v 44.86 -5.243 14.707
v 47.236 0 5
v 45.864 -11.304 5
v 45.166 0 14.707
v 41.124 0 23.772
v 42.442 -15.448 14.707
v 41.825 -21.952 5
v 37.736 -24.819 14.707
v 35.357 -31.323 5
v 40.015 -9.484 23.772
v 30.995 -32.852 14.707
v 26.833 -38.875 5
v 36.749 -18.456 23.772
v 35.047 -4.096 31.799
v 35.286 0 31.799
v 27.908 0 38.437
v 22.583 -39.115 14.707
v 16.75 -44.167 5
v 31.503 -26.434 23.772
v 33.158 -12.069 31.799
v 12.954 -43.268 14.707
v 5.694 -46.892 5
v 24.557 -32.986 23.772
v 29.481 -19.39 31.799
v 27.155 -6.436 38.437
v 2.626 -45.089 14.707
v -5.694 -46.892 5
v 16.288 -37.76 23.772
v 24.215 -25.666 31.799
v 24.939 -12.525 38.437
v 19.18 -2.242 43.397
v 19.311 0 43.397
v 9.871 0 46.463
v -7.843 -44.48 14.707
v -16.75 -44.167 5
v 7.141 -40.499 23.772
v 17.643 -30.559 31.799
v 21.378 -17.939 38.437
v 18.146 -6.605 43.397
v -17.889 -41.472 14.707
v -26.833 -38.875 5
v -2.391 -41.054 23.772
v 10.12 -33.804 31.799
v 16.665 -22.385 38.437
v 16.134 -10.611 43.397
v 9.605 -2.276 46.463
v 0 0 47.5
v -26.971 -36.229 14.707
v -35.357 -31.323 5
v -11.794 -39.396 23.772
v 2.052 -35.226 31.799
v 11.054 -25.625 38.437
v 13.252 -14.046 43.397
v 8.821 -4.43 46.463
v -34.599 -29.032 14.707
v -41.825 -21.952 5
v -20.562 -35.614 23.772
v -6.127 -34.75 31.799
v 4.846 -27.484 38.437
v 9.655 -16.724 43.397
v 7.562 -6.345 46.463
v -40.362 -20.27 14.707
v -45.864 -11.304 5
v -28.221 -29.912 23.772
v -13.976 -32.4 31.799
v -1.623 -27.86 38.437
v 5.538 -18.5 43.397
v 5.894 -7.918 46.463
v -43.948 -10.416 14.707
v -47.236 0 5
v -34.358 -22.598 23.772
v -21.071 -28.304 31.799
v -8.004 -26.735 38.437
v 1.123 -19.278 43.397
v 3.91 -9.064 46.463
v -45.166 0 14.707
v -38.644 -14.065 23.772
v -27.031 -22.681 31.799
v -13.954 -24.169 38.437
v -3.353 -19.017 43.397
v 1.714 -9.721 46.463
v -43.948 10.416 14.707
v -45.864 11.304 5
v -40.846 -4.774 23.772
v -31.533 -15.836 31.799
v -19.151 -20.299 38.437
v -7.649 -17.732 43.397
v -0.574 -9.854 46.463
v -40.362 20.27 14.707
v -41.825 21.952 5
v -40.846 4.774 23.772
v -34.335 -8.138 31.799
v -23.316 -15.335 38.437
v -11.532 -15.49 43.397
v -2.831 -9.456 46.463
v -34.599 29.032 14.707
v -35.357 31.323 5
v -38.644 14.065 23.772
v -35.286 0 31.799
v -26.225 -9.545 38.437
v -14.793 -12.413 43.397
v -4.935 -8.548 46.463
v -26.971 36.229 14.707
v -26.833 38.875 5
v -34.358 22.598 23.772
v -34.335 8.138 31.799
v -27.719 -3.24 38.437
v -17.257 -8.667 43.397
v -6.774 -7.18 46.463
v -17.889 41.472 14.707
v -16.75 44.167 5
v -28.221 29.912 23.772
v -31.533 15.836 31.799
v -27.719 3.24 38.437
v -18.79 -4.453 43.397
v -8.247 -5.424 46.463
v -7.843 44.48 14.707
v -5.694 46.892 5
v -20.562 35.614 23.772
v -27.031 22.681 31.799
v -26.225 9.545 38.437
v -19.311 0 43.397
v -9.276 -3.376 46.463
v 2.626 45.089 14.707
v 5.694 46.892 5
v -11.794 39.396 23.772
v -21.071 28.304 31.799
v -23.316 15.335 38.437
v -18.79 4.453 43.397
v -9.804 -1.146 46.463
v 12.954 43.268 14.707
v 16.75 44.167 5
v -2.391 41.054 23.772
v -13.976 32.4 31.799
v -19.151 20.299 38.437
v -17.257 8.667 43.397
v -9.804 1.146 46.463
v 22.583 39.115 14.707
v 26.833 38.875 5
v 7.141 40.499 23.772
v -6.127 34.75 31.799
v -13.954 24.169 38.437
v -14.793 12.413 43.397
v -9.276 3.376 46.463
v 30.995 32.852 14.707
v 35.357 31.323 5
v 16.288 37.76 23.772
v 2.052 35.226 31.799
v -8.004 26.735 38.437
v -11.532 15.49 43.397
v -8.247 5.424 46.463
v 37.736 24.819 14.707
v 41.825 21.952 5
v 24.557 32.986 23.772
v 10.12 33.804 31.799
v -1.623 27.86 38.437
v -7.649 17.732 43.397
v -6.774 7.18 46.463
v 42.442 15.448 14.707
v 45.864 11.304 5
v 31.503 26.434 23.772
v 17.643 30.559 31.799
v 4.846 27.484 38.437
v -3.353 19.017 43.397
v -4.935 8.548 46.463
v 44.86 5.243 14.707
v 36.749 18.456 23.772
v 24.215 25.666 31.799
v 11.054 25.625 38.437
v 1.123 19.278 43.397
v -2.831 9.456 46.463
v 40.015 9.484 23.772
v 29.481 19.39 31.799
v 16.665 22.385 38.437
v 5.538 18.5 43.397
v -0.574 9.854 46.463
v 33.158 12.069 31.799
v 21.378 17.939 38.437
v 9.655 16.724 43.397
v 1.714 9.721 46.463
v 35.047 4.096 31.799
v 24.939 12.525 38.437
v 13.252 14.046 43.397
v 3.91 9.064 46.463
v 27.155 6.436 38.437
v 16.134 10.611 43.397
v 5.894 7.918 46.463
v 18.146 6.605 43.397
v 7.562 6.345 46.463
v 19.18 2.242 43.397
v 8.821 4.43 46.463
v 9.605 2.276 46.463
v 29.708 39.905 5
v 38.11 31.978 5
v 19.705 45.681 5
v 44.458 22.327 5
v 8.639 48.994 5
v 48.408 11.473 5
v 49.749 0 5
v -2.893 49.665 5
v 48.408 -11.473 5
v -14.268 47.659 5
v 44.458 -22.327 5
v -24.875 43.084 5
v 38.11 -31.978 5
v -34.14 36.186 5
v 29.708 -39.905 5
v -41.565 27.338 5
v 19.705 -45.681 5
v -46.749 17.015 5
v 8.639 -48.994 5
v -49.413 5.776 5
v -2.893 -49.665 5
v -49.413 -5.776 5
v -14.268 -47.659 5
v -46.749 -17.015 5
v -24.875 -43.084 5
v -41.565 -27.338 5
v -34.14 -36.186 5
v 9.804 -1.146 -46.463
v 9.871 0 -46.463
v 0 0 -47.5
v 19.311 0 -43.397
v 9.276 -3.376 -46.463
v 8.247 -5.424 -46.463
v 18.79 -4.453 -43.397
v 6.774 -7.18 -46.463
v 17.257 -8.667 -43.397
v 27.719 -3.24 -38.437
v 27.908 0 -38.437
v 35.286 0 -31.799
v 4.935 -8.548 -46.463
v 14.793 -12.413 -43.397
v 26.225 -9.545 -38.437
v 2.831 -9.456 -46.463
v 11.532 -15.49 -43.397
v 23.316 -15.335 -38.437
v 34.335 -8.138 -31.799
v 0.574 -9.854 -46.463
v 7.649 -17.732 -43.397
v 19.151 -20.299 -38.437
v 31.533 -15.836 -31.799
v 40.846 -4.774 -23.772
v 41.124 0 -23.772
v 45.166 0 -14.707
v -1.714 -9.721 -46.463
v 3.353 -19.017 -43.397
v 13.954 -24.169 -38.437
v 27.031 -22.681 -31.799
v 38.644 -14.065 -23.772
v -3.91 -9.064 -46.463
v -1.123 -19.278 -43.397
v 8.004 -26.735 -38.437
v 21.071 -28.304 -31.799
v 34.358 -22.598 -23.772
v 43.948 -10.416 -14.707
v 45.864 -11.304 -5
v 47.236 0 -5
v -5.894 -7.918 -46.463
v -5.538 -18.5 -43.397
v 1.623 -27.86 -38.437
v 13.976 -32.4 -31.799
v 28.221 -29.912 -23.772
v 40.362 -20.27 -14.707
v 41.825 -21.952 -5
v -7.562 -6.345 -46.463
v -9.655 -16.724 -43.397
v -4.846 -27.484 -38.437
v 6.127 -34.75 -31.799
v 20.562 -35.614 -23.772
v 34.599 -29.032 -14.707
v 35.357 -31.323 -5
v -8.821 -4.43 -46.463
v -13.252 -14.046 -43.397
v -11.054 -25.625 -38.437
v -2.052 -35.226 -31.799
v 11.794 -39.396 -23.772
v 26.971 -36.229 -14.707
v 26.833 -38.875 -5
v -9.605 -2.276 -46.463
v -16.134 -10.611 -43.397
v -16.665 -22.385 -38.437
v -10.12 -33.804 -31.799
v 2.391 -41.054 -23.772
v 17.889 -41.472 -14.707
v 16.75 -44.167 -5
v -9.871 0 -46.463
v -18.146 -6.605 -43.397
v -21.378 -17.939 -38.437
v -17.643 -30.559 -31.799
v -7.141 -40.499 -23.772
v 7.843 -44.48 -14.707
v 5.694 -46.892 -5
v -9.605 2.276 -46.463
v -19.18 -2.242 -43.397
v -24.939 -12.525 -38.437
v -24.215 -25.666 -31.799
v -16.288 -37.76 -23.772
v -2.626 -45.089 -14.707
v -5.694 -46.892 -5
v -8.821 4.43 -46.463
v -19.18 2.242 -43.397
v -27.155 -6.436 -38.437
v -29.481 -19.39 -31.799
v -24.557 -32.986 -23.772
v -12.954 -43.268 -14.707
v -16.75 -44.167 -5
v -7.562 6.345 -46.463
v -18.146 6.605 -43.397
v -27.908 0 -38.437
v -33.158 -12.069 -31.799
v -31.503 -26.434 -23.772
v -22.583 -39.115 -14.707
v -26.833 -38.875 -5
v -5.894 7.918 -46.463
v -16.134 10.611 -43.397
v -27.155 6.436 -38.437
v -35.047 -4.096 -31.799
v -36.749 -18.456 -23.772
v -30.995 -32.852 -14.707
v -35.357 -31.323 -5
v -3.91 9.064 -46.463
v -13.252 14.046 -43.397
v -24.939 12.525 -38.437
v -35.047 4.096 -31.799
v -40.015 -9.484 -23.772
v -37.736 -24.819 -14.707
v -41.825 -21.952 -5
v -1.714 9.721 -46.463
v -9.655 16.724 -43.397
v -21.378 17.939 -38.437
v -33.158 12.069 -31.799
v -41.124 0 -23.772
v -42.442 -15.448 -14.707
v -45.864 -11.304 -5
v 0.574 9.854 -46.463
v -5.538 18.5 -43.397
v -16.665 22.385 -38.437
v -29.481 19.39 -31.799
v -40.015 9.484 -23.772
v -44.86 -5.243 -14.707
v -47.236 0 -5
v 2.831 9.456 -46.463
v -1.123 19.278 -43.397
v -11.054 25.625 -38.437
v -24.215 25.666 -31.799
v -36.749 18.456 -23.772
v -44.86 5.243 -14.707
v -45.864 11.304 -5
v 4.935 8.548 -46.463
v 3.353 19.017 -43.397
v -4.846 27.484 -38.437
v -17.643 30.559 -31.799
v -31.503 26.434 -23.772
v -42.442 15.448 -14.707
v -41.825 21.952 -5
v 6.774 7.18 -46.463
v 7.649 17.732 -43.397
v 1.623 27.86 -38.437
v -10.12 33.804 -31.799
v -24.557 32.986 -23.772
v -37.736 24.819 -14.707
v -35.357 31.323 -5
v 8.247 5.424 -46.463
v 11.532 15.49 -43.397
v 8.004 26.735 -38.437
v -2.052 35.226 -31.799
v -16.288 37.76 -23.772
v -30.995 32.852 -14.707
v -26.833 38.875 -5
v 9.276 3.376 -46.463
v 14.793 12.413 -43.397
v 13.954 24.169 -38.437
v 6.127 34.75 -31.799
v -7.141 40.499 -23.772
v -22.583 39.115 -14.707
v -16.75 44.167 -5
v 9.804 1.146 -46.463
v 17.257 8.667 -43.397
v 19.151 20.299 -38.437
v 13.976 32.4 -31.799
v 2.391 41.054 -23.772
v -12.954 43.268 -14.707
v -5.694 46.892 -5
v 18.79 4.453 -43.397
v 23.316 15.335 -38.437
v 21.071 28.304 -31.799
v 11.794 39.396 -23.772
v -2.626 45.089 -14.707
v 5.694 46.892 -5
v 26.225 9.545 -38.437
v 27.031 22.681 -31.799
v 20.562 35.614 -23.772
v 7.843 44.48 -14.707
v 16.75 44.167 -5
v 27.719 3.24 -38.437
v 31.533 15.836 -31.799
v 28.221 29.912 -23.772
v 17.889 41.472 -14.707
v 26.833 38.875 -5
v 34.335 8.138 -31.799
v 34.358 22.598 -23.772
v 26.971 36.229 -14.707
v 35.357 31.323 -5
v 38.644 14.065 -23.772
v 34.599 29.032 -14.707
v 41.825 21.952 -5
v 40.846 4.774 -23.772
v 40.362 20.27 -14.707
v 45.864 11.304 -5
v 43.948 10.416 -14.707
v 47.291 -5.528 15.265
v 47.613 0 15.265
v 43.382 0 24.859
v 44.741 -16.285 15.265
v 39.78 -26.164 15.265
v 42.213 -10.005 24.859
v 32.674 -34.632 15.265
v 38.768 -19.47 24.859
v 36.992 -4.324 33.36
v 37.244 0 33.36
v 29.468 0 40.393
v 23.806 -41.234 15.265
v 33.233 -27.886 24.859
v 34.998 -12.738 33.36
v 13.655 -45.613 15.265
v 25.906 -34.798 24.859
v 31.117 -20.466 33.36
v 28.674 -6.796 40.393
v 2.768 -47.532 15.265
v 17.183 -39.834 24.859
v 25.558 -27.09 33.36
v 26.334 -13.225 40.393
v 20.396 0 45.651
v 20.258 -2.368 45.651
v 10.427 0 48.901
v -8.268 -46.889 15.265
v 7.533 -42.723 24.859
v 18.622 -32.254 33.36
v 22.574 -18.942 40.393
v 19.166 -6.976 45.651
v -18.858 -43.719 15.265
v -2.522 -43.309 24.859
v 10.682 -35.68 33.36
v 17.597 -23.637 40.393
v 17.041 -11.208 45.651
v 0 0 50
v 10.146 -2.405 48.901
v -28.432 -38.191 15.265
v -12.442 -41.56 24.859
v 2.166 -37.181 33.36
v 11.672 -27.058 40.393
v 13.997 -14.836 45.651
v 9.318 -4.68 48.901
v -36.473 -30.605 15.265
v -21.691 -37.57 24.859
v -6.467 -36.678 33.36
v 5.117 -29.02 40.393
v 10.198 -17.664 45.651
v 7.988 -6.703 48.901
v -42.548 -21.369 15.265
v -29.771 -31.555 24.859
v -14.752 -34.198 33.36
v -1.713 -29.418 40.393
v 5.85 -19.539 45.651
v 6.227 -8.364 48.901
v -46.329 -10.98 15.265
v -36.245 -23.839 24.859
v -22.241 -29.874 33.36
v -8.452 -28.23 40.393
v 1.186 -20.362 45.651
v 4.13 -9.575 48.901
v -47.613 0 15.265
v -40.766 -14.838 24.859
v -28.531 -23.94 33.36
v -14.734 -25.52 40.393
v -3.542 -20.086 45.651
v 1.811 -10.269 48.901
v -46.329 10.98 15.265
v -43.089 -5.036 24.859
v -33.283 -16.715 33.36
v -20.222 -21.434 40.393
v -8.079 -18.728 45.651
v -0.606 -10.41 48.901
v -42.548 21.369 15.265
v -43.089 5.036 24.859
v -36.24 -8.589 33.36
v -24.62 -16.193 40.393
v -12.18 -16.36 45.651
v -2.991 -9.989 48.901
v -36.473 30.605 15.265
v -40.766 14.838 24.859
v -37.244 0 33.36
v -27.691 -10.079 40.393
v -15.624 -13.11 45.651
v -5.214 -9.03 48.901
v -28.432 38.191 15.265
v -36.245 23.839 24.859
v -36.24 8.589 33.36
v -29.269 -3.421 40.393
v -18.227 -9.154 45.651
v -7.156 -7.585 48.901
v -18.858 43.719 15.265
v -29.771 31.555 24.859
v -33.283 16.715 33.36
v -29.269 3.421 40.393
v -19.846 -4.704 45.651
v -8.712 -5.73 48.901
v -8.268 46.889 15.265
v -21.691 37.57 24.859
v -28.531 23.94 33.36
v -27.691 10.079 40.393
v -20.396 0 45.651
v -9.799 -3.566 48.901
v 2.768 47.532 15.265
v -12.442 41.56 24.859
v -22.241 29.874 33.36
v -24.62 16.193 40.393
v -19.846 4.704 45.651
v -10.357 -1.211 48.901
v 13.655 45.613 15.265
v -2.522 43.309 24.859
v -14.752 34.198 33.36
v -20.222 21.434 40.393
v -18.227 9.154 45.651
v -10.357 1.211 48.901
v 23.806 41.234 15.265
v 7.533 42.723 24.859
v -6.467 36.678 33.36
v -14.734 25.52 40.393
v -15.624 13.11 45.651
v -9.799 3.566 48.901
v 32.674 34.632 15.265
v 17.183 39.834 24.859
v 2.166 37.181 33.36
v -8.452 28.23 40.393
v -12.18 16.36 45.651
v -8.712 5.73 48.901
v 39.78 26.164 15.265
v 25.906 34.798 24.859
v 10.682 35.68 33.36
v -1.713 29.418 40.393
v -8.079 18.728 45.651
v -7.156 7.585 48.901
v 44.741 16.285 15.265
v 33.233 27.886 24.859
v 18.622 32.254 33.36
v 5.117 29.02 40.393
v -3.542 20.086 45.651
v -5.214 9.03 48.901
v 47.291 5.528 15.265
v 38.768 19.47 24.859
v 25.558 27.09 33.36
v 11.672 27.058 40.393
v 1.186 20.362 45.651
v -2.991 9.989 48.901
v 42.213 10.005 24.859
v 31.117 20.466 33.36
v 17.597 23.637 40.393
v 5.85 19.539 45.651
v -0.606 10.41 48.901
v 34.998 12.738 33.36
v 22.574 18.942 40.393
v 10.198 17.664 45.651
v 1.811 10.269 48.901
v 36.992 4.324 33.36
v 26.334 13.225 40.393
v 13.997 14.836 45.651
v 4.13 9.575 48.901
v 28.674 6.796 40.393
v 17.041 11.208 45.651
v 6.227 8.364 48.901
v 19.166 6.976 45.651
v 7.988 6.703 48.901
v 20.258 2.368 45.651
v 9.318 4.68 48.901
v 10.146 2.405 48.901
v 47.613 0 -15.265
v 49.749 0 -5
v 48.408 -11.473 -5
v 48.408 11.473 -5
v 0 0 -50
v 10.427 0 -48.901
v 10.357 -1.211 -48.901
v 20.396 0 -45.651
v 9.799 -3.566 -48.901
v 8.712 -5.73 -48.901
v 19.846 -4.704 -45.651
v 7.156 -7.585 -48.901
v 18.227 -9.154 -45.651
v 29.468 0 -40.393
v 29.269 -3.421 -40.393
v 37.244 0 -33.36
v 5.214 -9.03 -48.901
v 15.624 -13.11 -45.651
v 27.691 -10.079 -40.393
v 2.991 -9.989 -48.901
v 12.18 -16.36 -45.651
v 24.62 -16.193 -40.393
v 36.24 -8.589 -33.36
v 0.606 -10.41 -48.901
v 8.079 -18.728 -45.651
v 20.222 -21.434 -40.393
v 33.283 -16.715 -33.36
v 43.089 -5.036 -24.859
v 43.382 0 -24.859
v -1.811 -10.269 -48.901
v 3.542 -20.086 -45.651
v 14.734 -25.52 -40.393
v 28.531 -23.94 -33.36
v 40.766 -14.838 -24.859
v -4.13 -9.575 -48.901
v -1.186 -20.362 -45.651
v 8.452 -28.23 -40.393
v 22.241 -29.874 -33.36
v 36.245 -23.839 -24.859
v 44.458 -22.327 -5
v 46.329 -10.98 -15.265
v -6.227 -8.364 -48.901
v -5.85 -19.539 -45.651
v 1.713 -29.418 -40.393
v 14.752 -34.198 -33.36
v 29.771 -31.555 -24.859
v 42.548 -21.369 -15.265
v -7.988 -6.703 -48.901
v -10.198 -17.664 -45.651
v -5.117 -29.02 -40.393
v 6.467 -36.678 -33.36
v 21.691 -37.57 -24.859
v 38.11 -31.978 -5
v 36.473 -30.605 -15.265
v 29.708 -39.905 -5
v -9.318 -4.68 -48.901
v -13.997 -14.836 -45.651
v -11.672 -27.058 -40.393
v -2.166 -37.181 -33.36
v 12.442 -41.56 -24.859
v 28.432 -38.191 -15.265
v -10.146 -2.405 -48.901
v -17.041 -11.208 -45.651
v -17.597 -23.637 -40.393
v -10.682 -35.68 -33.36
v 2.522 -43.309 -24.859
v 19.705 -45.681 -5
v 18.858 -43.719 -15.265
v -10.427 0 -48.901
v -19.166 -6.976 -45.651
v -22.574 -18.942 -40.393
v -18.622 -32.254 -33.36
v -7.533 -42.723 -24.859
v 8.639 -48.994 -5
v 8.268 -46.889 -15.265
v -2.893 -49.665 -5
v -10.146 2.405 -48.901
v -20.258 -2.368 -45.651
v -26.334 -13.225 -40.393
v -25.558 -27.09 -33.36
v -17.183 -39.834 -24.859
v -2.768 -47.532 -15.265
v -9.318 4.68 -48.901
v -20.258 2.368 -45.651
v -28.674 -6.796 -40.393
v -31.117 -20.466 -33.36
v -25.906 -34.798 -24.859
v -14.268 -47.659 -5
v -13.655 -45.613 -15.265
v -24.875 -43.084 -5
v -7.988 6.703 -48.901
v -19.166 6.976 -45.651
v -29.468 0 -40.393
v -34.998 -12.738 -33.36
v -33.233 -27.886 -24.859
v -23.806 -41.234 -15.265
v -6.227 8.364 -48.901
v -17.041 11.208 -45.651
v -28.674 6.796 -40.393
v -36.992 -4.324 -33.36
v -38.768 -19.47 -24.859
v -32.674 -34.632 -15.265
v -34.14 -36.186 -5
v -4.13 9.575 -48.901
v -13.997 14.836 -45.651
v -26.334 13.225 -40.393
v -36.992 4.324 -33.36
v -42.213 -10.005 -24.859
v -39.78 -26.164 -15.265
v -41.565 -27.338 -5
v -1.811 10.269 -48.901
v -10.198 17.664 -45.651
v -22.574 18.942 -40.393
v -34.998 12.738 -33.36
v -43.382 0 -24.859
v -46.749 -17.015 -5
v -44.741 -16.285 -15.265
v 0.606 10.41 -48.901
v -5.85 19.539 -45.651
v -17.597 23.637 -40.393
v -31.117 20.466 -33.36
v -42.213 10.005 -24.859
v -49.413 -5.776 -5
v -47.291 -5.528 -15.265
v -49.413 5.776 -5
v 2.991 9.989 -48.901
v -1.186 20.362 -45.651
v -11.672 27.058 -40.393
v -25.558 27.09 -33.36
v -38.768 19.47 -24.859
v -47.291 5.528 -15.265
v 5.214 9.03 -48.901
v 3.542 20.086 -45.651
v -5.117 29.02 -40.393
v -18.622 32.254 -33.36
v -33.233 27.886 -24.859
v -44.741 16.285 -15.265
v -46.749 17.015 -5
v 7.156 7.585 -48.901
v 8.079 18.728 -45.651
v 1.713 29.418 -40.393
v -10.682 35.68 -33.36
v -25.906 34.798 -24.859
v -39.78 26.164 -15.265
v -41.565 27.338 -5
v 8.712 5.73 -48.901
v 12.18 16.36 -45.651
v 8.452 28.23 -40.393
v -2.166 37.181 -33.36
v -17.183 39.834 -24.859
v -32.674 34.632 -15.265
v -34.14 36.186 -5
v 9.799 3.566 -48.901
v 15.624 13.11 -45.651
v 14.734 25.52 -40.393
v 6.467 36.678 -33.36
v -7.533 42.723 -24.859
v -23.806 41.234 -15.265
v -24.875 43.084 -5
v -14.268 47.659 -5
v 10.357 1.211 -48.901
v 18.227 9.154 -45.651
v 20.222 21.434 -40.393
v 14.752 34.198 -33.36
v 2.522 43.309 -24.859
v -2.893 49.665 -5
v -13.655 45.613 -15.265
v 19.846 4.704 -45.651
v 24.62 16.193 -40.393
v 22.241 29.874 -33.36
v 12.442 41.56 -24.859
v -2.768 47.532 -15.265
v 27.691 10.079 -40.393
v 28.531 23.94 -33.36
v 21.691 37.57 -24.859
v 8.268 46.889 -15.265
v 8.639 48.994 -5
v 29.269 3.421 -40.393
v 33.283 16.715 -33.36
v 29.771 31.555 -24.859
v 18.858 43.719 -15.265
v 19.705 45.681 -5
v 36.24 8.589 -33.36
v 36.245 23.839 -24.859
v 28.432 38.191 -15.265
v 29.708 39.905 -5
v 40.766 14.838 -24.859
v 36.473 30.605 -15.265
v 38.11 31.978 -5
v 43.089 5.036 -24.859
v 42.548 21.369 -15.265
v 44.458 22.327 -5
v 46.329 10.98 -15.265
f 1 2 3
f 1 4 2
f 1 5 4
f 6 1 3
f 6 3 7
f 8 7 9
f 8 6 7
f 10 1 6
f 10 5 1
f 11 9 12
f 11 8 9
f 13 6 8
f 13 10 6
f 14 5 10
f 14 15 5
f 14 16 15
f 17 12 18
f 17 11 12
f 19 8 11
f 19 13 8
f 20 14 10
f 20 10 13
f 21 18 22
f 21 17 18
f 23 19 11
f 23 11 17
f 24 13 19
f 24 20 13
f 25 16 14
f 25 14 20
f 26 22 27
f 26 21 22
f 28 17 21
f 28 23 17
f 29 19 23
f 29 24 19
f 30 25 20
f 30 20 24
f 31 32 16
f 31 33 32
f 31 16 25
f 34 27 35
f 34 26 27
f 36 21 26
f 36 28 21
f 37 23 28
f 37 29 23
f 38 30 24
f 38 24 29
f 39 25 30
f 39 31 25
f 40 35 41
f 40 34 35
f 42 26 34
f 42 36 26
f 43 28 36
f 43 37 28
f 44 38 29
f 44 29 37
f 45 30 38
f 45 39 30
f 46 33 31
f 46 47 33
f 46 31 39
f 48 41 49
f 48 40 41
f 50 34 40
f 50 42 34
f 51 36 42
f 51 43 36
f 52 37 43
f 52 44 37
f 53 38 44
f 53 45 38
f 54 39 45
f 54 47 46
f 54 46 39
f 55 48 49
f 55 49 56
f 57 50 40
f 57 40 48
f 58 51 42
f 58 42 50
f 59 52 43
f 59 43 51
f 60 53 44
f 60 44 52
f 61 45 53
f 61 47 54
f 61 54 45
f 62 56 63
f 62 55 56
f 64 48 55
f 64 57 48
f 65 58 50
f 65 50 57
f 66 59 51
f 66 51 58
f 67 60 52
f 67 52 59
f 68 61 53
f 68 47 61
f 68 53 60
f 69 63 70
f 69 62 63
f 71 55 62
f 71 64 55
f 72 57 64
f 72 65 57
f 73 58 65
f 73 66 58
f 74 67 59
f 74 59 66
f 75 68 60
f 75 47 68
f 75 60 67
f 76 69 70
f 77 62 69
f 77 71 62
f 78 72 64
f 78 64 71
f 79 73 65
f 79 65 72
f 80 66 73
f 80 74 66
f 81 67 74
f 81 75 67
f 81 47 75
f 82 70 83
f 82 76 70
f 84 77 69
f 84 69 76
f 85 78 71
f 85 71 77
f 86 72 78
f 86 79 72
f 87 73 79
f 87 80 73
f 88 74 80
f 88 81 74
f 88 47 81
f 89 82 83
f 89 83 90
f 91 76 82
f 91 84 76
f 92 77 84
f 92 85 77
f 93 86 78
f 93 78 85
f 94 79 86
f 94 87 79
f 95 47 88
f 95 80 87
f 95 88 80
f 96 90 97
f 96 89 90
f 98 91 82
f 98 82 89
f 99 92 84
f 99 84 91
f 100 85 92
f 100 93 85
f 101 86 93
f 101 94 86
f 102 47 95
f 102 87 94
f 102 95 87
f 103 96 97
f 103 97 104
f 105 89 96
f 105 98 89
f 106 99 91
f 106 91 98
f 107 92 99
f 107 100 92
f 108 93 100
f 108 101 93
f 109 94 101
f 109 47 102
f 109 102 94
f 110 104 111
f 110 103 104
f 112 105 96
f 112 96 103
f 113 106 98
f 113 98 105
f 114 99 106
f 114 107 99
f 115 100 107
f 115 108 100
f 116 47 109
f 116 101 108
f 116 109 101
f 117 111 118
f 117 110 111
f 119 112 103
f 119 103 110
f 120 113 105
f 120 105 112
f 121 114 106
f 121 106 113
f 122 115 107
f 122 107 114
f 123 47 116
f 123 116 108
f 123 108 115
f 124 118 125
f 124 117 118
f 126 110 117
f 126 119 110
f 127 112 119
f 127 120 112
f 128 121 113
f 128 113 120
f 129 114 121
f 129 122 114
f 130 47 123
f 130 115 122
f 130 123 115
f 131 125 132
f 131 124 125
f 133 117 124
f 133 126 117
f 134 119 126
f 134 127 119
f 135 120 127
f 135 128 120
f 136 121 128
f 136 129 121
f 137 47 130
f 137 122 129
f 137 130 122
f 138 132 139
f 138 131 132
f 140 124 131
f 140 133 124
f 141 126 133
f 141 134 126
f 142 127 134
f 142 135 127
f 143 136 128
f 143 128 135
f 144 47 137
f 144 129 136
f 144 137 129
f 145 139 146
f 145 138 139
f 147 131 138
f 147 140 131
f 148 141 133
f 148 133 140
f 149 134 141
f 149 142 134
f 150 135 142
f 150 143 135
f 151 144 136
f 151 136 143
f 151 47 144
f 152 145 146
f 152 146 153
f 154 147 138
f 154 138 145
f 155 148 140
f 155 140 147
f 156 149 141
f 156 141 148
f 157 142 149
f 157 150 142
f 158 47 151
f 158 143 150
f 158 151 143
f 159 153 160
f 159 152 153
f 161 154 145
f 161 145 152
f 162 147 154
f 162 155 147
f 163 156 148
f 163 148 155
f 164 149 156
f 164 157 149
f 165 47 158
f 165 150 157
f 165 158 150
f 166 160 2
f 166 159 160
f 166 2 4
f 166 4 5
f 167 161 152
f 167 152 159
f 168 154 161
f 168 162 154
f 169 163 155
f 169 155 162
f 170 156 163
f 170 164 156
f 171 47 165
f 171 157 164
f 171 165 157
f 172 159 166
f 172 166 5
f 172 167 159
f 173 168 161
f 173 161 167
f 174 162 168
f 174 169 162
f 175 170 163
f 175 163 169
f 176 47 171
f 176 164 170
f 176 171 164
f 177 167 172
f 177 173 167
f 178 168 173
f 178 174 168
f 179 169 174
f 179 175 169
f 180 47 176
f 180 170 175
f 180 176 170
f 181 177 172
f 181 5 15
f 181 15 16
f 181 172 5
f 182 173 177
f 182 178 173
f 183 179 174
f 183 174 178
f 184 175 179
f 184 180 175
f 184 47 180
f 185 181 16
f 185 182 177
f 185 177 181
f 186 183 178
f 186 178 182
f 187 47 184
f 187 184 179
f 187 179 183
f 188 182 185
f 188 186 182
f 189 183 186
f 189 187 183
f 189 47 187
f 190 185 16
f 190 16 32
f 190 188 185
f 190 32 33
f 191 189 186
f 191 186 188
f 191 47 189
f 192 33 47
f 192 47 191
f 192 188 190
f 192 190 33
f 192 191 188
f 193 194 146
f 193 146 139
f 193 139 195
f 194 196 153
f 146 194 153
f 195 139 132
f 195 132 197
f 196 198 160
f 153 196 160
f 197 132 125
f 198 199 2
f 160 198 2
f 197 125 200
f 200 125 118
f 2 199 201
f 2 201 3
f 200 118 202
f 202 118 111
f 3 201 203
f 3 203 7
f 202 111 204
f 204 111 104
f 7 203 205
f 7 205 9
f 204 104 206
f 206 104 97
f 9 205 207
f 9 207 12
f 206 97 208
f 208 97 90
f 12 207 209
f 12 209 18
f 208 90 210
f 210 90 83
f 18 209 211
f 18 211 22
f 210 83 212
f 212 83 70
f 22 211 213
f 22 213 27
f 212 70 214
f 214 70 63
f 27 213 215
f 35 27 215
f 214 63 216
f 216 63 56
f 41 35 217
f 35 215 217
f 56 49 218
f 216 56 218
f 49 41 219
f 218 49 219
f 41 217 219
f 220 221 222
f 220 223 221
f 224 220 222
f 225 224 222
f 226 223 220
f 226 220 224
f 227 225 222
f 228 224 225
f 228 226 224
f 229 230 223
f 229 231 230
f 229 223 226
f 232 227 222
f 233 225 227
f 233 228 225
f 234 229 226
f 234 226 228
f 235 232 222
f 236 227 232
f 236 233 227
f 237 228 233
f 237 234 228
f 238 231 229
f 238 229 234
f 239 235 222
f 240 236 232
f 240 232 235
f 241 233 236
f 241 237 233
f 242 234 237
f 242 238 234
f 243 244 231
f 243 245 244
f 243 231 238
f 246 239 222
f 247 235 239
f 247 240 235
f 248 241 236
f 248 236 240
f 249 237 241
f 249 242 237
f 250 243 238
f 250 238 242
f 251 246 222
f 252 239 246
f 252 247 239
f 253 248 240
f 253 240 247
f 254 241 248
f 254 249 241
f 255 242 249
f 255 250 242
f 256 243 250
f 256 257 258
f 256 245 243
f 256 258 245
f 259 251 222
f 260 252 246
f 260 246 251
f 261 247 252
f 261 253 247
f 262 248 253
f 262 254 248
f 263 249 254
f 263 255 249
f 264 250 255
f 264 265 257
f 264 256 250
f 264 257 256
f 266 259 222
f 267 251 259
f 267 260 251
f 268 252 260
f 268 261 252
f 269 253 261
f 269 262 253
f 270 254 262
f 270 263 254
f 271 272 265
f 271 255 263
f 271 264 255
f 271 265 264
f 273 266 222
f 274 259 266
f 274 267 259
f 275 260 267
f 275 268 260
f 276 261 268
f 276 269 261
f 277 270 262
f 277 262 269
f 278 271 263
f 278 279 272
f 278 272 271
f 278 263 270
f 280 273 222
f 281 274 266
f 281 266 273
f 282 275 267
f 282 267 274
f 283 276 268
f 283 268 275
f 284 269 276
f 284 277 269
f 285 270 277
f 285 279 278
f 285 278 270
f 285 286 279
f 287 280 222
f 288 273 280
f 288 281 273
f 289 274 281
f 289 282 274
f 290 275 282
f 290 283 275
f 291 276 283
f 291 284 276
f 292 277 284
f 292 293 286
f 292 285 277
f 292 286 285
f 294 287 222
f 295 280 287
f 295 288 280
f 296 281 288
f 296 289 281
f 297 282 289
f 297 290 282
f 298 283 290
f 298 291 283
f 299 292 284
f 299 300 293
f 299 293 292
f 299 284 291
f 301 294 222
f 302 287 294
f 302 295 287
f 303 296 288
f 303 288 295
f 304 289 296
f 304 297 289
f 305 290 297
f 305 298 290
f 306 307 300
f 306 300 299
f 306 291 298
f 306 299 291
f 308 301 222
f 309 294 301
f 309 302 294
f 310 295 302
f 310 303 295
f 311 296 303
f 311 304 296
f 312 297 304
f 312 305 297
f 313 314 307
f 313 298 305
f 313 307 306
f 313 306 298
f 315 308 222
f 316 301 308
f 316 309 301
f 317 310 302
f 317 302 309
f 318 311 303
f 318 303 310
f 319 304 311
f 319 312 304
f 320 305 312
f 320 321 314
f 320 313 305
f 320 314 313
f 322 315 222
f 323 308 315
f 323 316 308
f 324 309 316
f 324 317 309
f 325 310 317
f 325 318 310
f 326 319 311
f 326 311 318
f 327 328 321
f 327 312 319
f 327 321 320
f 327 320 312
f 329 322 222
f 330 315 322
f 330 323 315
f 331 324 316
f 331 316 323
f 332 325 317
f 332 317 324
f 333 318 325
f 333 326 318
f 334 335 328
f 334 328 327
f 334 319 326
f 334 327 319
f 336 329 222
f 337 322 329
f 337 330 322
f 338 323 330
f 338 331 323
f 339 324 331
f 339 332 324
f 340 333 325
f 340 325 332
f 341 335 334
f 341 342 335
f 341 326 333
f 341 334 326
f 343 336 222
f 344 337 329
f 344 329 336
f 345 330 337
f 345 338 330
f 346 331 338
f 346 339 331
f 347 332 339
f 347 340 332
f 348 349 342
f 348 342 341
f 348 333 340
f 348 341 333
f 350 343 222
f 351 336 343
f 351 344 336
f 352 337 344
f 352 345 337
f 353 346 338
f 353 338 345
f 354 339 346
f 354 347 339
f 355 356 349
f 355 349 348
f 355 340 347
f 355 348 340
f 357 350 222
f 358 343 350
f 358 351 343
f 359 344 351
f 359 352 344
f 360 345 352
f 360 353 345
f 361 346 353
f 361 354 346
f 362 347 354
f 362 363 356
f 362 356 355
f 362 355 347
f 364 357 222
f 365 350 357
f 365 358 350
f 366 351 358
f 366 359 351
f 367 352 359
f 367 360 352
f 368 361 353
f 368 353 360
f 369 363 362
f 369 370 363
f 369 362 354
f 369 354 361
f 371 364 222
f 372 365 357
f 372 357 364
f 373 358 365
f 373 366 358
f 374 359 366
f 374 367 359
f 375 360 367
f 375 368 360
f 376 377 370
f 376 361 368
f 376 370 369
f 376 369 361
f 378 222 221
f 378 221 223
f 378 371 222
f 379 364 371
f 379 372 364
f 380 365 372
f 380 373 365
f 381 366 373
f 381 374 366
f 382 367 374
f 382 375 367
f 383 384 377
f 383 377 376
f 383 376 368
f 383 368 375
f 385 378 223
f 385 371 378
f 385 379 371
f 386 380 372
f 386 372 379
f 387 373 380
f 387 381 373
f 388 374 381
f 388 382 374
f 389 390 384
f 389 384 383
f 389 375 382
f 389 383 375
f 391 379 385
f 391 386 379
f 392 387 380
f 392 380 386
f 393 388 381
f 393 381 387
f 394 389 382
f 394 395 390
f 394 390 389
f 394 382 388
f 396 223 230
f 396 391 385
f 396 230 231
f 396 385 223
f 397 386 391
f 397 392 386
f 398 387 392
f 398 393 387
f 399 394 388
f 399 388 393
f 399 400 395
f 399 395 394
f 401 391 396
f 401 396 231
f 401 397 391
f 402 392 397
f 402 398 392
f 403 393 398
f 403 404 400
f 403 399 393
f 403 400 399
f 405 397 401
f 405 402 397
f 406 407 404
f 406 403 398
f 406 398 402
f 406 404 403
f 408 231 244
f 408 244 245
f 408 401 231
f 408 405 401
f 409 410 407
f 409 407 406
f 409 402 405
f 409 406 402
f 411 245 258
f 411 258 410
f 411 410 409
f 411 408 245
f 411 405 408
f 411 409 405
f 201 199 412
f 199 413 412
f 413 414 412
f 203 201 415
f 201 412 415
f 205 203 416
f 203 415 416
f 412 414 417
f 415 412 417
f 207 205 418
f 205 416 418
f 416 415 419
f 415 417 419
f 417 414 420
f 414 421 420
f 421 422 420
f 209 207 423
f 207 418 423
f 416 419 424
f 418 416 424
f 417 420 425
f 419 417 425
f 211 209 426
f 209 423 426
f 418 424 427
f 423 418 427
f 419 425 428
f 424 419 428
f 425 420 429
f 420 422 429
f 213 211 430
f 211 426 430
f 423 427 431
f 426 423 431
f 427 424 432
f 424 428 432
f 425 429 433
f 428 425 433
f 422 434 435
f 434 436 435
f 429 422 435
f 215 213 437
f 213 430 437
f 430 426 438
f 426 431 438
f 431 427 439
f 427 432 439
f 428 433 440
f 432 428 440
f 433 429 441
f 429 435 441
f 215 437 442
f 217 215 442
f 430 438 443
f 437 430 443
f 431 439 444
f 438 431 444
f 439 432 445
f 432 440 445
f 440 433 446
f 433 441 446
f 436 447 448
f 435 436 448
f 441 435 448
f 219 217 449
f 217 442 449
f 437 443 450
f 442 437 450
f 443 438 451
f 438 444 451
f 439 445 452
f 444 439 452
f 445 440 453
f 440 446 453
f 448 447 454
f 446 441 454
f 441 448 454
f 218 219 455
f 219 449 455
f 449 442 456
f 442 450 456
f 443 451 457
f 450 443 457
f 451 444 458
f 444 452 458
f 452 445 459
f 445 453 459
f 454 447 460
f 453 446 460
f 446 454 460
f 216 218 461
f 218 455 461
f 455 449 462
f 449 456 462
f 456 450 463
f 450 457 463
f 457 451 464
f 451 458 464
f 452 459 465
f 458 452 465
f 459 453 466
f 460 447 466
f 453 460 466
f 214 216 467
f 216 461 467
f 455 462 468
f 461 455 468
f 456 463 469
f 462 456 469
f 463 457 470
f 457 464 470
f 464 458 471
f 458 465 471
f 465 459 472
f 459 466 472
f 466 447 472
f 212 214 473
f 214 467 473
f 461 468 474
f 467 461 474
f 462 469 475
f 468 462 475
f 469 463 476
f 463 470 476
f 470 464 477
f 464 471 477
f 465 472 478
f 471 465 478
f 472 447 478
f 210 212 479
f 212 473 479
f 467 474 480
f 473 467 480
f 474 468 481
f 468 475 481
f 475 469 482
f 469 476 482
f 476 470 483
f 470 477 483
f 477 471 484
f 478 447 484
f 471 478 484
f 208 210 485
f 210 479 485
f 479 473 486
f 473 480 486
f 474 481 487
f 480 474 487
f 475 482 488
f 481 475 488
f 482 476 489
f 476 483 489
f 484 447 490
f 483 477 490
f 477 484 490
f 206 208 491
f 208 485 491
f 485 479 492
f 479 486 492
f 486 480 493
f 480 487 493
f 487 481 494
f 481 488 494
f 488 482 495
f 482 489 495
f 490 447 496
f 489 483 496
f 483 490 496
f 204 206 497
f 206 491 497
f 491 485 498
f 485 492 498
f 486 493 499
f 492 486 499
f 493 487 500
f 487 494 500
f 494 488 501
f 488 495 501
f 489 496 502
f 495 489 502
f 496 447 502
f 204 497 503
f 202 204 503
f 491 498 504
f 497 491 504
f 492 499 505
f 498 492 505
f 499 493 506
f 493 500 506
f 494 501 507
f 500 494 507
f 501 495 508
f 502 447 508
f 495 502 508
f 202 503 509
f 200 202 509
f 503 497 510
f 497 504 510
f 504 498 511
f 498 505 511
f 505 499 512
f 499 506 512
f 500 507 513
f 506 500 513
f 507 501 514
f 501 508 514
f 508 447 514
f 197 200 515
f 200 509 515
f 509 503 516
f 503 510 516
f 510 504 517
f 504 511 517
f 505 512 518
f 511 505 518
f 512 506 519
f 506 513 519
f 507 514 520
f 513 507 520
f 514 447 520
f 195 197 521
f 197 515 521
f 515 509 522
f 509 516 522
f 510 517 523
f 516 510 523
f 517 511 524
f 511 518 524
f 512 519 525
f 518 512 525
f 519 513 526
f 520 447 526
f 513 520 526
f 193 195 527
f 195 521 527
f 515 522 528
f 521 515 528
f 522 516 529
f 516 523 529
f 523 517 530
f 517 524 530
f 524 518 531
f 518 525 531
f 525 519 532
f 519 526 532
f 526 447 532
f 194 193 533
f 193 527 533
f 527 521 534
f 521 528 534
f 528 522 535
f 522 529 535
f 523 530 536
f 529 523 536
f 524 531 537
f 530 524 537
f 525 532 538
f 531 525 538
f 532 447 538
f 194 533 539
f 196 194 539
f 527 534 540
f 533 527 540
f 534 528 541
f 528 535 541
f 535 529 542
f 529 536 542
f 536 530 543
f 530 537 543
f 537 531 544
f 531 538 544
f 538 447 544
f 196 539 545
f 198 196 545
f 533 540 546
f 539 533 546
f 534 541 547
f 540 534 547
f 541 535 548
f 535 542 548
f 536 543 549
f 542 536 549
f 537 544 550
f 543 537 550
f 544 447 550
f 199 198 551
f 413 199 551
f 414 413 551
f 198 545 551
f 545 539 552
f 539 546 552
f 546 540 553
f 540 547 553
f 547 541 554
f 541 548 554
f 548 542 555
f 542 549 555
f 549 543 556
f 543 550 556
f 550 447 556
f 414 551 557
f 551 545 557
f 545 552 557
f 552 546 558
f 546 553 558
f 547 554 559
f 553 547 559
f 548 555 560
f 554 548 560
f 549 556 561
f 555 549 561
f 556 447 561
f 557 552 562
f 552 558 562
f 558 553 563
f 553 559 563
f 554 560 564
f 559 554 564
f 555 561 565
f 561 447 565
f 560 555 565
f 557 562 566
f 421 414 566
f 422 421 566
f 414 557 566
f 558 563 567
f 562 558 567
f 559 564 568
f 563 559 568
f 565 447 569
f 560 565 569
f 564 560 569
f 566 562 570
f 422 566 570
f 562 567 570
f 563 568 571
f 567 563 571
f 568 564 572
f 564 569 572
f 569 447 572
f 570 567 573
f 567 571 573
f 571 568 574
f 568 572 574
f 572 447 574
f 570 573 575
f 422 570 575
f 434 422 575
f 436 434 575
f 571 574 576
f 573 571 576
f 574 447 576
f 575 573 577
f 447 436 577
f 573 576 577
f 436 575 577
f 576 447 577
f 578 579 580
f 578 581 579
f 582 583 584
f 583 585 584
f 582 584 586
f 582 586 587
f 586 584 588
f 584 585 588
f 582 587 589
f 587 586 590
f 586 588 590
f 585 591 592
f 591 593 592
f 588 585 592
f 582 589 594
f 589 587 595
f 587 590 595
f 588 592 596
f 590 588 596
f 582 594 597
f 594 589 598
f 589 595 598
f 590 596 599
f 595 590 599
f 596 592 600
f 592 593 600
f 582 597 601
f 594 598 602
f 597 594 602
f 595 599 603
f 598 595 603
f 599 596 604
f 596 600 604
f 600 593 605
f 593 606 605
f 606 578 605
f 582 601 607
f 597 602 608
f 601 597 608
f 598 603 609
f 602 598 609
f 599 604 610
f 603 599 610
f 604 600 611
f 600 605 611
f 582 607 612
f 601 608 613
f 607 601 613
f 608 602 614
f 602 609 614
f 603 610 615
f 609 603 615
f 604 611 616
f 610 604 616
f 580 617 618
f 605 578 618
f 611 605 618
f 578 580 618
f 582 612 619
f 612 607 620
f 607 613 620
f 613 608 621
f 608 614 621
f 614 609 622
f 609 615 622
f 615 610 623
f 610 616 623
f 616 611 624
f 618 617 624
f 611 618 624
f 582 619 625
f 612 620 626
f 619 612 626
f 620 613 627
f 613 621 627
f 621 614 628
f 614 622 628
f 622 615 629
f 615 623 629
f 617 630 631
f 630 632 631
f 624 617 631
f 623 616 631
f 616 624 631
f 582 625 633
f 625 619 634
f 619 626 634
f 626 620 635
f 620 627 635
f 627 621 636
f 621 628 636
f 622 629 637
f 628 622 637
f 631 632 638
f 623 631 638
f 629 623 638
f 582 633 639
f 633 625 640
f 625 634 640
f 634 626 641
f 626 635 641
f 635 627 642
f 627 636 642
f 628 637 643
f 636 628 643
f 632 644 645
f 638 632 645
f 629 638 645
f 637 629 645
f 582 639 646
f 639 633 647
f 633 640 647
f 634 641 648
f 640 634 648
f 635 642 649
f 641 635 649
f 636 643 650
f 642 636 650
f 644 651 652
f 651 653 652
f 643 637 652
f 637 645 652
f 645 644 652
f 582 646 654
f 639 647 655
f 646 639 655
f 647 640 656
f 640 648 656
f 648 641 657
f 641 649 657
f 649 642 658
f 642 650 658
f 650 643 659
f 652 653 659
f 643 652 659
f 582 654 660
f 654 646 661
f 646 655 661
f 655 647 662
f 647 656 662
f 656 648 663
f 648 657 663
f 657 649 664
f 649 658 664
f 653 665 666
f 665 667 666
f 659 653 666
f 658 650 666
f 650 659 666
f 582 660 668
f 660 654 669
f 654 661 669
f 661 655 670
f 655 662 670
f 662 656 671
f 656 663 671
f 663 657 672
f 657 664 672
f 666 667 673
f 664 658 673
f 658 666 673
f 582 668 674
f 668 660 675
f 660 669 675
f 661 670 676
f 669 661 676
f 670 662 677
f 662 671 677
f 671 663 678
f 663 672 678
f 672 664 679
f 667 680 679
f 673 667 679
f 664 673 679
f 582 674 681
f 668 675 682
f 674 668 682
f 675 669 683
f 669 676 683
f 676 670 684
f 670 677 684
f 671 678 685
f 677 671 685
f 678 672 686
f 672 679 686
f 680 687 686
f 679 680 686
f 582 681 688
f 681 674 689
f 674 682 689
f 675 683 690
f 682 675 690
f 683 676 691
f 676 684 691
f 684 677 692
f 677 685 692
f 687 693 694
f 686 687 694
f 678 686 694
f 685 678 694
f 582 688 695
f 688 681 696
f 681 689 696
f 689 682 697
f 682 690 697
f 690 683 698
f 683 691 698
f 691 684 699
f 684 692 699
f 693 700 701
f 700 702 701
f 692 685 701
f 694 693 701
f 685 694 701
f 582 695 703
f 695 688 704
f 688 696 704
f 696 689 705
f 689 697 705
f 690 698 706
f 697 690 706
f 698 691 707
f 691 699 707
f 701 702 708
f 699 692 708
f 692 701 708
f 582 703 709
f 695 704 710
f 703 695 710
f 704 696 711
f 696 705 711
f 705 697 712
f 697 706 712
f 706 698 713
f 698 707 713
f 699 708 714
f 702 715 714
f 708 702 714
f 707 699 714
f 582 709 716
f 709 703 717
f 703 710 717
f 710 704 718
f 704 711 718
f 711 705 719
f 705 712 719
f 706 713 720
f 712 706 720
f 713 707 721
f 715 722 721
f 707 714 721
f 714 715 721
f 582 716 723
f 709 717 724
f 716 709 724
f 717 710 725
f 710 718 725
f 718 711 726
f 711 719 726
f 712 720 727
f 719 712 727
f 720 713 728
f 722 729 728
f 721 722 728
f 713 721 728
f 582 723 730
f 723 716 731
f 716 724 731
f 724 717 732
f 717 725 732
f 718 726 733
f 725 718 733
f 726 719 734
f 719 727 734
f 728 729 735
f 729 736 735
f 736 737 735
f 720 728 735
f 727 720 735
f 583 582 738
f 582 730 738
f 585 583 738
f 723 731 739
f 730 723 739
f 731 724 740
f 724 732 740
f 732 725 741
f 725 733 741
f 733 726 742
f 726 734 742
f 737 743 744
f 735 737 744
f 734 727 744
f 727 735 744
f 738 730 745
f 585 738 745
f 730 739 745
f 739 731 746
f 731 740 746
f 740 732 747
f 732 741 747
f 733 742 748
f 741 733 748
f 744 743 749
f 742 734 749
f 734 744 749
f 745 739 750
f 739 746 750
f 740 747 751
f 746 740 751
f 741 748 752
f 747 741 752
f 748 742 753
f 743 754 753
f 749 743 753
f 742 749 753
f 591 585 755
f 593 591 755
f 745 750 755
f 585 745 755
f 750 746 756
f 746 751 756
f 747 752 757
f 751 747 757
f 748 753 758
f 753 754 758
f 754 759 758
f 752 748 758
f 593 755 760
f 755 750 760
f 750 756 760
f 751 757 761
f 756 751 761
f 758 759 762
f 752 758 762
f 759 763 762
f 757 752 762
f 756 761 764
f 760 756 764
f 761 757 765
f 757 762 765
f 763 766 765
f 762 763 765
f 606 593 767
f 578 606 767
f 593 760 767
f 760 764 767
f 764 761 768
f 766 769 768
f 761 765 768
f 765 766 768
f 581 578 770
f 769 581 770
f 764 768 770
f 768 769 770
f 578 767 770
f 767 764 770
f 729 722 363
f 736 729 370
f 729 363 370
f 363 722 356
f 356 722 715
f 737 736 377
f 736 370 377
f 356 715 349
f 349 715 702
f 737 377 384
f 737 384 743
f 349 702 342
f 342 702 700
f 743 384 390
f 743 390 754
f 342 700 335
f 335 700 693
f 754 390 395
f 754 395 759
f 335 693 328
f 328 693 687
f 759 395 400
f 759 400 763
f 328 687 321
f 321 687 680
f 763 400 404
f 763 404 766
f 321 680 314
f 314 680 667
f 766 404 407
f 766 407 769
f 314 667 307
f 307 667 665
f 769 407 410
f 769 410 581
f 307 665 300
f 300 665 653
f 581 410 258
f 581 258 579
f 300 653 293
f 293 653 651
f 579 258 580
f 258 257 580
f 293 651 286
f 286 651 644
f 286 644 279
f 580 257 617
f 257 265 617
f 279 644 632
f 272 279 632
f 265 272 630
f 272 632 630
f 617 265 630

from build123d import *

# Parameters (mm, degrees)
F3_T   = -2.5
F3_2_T = -2.5


with BuildPart() as f2:
    # F1 (on Front) → F2 (revolve)
    with BuildSketch(Plane.XZ):
        with BuildLine():
            ThreePointArc((49.7493718553, 5), (33.5410196625, 37.0809924355), (0, 50))
            Line((0, 50), (0, 5))
            Line((0, 5), (49.7493718553, 5))
        make_face()
    revolve(axis=Axis((0, 0, 27.5), (0, 0, -1)))

    # F3
    f3_openings = [f2.faces().sort_by_distance(p)[0] for p in [
        (0, 0, 5),
    ]]
    offset(amount=F3_T, openings=f3_openings)


with BuildPart() as f2b:
    # F1 (on Front) → F2, piece 2 (revolve)
    with BuildSketch(Plane.XZ):
        with BuildLine():
            Line((0, -5), (0, -50))
            ThreePointArc((0, -50), (33.5410196625, -37.0809924355), (49.7493718553, -5))
            Line((49.7493718553, -5), (0, -5))
        make_face()
    revolve(axis=Axis((0, 0, 27.5), (0, 0, -1)))

    # F3#2
    f3_2_openings = [f2b.faces().sort_by_distance(p)[0] for p in [
        (0, 0, -5),
    ]]
    offset(amount=F3_2_T, openings=f3_2_openings)


solid = Compound([f2.part, f2b.part])
